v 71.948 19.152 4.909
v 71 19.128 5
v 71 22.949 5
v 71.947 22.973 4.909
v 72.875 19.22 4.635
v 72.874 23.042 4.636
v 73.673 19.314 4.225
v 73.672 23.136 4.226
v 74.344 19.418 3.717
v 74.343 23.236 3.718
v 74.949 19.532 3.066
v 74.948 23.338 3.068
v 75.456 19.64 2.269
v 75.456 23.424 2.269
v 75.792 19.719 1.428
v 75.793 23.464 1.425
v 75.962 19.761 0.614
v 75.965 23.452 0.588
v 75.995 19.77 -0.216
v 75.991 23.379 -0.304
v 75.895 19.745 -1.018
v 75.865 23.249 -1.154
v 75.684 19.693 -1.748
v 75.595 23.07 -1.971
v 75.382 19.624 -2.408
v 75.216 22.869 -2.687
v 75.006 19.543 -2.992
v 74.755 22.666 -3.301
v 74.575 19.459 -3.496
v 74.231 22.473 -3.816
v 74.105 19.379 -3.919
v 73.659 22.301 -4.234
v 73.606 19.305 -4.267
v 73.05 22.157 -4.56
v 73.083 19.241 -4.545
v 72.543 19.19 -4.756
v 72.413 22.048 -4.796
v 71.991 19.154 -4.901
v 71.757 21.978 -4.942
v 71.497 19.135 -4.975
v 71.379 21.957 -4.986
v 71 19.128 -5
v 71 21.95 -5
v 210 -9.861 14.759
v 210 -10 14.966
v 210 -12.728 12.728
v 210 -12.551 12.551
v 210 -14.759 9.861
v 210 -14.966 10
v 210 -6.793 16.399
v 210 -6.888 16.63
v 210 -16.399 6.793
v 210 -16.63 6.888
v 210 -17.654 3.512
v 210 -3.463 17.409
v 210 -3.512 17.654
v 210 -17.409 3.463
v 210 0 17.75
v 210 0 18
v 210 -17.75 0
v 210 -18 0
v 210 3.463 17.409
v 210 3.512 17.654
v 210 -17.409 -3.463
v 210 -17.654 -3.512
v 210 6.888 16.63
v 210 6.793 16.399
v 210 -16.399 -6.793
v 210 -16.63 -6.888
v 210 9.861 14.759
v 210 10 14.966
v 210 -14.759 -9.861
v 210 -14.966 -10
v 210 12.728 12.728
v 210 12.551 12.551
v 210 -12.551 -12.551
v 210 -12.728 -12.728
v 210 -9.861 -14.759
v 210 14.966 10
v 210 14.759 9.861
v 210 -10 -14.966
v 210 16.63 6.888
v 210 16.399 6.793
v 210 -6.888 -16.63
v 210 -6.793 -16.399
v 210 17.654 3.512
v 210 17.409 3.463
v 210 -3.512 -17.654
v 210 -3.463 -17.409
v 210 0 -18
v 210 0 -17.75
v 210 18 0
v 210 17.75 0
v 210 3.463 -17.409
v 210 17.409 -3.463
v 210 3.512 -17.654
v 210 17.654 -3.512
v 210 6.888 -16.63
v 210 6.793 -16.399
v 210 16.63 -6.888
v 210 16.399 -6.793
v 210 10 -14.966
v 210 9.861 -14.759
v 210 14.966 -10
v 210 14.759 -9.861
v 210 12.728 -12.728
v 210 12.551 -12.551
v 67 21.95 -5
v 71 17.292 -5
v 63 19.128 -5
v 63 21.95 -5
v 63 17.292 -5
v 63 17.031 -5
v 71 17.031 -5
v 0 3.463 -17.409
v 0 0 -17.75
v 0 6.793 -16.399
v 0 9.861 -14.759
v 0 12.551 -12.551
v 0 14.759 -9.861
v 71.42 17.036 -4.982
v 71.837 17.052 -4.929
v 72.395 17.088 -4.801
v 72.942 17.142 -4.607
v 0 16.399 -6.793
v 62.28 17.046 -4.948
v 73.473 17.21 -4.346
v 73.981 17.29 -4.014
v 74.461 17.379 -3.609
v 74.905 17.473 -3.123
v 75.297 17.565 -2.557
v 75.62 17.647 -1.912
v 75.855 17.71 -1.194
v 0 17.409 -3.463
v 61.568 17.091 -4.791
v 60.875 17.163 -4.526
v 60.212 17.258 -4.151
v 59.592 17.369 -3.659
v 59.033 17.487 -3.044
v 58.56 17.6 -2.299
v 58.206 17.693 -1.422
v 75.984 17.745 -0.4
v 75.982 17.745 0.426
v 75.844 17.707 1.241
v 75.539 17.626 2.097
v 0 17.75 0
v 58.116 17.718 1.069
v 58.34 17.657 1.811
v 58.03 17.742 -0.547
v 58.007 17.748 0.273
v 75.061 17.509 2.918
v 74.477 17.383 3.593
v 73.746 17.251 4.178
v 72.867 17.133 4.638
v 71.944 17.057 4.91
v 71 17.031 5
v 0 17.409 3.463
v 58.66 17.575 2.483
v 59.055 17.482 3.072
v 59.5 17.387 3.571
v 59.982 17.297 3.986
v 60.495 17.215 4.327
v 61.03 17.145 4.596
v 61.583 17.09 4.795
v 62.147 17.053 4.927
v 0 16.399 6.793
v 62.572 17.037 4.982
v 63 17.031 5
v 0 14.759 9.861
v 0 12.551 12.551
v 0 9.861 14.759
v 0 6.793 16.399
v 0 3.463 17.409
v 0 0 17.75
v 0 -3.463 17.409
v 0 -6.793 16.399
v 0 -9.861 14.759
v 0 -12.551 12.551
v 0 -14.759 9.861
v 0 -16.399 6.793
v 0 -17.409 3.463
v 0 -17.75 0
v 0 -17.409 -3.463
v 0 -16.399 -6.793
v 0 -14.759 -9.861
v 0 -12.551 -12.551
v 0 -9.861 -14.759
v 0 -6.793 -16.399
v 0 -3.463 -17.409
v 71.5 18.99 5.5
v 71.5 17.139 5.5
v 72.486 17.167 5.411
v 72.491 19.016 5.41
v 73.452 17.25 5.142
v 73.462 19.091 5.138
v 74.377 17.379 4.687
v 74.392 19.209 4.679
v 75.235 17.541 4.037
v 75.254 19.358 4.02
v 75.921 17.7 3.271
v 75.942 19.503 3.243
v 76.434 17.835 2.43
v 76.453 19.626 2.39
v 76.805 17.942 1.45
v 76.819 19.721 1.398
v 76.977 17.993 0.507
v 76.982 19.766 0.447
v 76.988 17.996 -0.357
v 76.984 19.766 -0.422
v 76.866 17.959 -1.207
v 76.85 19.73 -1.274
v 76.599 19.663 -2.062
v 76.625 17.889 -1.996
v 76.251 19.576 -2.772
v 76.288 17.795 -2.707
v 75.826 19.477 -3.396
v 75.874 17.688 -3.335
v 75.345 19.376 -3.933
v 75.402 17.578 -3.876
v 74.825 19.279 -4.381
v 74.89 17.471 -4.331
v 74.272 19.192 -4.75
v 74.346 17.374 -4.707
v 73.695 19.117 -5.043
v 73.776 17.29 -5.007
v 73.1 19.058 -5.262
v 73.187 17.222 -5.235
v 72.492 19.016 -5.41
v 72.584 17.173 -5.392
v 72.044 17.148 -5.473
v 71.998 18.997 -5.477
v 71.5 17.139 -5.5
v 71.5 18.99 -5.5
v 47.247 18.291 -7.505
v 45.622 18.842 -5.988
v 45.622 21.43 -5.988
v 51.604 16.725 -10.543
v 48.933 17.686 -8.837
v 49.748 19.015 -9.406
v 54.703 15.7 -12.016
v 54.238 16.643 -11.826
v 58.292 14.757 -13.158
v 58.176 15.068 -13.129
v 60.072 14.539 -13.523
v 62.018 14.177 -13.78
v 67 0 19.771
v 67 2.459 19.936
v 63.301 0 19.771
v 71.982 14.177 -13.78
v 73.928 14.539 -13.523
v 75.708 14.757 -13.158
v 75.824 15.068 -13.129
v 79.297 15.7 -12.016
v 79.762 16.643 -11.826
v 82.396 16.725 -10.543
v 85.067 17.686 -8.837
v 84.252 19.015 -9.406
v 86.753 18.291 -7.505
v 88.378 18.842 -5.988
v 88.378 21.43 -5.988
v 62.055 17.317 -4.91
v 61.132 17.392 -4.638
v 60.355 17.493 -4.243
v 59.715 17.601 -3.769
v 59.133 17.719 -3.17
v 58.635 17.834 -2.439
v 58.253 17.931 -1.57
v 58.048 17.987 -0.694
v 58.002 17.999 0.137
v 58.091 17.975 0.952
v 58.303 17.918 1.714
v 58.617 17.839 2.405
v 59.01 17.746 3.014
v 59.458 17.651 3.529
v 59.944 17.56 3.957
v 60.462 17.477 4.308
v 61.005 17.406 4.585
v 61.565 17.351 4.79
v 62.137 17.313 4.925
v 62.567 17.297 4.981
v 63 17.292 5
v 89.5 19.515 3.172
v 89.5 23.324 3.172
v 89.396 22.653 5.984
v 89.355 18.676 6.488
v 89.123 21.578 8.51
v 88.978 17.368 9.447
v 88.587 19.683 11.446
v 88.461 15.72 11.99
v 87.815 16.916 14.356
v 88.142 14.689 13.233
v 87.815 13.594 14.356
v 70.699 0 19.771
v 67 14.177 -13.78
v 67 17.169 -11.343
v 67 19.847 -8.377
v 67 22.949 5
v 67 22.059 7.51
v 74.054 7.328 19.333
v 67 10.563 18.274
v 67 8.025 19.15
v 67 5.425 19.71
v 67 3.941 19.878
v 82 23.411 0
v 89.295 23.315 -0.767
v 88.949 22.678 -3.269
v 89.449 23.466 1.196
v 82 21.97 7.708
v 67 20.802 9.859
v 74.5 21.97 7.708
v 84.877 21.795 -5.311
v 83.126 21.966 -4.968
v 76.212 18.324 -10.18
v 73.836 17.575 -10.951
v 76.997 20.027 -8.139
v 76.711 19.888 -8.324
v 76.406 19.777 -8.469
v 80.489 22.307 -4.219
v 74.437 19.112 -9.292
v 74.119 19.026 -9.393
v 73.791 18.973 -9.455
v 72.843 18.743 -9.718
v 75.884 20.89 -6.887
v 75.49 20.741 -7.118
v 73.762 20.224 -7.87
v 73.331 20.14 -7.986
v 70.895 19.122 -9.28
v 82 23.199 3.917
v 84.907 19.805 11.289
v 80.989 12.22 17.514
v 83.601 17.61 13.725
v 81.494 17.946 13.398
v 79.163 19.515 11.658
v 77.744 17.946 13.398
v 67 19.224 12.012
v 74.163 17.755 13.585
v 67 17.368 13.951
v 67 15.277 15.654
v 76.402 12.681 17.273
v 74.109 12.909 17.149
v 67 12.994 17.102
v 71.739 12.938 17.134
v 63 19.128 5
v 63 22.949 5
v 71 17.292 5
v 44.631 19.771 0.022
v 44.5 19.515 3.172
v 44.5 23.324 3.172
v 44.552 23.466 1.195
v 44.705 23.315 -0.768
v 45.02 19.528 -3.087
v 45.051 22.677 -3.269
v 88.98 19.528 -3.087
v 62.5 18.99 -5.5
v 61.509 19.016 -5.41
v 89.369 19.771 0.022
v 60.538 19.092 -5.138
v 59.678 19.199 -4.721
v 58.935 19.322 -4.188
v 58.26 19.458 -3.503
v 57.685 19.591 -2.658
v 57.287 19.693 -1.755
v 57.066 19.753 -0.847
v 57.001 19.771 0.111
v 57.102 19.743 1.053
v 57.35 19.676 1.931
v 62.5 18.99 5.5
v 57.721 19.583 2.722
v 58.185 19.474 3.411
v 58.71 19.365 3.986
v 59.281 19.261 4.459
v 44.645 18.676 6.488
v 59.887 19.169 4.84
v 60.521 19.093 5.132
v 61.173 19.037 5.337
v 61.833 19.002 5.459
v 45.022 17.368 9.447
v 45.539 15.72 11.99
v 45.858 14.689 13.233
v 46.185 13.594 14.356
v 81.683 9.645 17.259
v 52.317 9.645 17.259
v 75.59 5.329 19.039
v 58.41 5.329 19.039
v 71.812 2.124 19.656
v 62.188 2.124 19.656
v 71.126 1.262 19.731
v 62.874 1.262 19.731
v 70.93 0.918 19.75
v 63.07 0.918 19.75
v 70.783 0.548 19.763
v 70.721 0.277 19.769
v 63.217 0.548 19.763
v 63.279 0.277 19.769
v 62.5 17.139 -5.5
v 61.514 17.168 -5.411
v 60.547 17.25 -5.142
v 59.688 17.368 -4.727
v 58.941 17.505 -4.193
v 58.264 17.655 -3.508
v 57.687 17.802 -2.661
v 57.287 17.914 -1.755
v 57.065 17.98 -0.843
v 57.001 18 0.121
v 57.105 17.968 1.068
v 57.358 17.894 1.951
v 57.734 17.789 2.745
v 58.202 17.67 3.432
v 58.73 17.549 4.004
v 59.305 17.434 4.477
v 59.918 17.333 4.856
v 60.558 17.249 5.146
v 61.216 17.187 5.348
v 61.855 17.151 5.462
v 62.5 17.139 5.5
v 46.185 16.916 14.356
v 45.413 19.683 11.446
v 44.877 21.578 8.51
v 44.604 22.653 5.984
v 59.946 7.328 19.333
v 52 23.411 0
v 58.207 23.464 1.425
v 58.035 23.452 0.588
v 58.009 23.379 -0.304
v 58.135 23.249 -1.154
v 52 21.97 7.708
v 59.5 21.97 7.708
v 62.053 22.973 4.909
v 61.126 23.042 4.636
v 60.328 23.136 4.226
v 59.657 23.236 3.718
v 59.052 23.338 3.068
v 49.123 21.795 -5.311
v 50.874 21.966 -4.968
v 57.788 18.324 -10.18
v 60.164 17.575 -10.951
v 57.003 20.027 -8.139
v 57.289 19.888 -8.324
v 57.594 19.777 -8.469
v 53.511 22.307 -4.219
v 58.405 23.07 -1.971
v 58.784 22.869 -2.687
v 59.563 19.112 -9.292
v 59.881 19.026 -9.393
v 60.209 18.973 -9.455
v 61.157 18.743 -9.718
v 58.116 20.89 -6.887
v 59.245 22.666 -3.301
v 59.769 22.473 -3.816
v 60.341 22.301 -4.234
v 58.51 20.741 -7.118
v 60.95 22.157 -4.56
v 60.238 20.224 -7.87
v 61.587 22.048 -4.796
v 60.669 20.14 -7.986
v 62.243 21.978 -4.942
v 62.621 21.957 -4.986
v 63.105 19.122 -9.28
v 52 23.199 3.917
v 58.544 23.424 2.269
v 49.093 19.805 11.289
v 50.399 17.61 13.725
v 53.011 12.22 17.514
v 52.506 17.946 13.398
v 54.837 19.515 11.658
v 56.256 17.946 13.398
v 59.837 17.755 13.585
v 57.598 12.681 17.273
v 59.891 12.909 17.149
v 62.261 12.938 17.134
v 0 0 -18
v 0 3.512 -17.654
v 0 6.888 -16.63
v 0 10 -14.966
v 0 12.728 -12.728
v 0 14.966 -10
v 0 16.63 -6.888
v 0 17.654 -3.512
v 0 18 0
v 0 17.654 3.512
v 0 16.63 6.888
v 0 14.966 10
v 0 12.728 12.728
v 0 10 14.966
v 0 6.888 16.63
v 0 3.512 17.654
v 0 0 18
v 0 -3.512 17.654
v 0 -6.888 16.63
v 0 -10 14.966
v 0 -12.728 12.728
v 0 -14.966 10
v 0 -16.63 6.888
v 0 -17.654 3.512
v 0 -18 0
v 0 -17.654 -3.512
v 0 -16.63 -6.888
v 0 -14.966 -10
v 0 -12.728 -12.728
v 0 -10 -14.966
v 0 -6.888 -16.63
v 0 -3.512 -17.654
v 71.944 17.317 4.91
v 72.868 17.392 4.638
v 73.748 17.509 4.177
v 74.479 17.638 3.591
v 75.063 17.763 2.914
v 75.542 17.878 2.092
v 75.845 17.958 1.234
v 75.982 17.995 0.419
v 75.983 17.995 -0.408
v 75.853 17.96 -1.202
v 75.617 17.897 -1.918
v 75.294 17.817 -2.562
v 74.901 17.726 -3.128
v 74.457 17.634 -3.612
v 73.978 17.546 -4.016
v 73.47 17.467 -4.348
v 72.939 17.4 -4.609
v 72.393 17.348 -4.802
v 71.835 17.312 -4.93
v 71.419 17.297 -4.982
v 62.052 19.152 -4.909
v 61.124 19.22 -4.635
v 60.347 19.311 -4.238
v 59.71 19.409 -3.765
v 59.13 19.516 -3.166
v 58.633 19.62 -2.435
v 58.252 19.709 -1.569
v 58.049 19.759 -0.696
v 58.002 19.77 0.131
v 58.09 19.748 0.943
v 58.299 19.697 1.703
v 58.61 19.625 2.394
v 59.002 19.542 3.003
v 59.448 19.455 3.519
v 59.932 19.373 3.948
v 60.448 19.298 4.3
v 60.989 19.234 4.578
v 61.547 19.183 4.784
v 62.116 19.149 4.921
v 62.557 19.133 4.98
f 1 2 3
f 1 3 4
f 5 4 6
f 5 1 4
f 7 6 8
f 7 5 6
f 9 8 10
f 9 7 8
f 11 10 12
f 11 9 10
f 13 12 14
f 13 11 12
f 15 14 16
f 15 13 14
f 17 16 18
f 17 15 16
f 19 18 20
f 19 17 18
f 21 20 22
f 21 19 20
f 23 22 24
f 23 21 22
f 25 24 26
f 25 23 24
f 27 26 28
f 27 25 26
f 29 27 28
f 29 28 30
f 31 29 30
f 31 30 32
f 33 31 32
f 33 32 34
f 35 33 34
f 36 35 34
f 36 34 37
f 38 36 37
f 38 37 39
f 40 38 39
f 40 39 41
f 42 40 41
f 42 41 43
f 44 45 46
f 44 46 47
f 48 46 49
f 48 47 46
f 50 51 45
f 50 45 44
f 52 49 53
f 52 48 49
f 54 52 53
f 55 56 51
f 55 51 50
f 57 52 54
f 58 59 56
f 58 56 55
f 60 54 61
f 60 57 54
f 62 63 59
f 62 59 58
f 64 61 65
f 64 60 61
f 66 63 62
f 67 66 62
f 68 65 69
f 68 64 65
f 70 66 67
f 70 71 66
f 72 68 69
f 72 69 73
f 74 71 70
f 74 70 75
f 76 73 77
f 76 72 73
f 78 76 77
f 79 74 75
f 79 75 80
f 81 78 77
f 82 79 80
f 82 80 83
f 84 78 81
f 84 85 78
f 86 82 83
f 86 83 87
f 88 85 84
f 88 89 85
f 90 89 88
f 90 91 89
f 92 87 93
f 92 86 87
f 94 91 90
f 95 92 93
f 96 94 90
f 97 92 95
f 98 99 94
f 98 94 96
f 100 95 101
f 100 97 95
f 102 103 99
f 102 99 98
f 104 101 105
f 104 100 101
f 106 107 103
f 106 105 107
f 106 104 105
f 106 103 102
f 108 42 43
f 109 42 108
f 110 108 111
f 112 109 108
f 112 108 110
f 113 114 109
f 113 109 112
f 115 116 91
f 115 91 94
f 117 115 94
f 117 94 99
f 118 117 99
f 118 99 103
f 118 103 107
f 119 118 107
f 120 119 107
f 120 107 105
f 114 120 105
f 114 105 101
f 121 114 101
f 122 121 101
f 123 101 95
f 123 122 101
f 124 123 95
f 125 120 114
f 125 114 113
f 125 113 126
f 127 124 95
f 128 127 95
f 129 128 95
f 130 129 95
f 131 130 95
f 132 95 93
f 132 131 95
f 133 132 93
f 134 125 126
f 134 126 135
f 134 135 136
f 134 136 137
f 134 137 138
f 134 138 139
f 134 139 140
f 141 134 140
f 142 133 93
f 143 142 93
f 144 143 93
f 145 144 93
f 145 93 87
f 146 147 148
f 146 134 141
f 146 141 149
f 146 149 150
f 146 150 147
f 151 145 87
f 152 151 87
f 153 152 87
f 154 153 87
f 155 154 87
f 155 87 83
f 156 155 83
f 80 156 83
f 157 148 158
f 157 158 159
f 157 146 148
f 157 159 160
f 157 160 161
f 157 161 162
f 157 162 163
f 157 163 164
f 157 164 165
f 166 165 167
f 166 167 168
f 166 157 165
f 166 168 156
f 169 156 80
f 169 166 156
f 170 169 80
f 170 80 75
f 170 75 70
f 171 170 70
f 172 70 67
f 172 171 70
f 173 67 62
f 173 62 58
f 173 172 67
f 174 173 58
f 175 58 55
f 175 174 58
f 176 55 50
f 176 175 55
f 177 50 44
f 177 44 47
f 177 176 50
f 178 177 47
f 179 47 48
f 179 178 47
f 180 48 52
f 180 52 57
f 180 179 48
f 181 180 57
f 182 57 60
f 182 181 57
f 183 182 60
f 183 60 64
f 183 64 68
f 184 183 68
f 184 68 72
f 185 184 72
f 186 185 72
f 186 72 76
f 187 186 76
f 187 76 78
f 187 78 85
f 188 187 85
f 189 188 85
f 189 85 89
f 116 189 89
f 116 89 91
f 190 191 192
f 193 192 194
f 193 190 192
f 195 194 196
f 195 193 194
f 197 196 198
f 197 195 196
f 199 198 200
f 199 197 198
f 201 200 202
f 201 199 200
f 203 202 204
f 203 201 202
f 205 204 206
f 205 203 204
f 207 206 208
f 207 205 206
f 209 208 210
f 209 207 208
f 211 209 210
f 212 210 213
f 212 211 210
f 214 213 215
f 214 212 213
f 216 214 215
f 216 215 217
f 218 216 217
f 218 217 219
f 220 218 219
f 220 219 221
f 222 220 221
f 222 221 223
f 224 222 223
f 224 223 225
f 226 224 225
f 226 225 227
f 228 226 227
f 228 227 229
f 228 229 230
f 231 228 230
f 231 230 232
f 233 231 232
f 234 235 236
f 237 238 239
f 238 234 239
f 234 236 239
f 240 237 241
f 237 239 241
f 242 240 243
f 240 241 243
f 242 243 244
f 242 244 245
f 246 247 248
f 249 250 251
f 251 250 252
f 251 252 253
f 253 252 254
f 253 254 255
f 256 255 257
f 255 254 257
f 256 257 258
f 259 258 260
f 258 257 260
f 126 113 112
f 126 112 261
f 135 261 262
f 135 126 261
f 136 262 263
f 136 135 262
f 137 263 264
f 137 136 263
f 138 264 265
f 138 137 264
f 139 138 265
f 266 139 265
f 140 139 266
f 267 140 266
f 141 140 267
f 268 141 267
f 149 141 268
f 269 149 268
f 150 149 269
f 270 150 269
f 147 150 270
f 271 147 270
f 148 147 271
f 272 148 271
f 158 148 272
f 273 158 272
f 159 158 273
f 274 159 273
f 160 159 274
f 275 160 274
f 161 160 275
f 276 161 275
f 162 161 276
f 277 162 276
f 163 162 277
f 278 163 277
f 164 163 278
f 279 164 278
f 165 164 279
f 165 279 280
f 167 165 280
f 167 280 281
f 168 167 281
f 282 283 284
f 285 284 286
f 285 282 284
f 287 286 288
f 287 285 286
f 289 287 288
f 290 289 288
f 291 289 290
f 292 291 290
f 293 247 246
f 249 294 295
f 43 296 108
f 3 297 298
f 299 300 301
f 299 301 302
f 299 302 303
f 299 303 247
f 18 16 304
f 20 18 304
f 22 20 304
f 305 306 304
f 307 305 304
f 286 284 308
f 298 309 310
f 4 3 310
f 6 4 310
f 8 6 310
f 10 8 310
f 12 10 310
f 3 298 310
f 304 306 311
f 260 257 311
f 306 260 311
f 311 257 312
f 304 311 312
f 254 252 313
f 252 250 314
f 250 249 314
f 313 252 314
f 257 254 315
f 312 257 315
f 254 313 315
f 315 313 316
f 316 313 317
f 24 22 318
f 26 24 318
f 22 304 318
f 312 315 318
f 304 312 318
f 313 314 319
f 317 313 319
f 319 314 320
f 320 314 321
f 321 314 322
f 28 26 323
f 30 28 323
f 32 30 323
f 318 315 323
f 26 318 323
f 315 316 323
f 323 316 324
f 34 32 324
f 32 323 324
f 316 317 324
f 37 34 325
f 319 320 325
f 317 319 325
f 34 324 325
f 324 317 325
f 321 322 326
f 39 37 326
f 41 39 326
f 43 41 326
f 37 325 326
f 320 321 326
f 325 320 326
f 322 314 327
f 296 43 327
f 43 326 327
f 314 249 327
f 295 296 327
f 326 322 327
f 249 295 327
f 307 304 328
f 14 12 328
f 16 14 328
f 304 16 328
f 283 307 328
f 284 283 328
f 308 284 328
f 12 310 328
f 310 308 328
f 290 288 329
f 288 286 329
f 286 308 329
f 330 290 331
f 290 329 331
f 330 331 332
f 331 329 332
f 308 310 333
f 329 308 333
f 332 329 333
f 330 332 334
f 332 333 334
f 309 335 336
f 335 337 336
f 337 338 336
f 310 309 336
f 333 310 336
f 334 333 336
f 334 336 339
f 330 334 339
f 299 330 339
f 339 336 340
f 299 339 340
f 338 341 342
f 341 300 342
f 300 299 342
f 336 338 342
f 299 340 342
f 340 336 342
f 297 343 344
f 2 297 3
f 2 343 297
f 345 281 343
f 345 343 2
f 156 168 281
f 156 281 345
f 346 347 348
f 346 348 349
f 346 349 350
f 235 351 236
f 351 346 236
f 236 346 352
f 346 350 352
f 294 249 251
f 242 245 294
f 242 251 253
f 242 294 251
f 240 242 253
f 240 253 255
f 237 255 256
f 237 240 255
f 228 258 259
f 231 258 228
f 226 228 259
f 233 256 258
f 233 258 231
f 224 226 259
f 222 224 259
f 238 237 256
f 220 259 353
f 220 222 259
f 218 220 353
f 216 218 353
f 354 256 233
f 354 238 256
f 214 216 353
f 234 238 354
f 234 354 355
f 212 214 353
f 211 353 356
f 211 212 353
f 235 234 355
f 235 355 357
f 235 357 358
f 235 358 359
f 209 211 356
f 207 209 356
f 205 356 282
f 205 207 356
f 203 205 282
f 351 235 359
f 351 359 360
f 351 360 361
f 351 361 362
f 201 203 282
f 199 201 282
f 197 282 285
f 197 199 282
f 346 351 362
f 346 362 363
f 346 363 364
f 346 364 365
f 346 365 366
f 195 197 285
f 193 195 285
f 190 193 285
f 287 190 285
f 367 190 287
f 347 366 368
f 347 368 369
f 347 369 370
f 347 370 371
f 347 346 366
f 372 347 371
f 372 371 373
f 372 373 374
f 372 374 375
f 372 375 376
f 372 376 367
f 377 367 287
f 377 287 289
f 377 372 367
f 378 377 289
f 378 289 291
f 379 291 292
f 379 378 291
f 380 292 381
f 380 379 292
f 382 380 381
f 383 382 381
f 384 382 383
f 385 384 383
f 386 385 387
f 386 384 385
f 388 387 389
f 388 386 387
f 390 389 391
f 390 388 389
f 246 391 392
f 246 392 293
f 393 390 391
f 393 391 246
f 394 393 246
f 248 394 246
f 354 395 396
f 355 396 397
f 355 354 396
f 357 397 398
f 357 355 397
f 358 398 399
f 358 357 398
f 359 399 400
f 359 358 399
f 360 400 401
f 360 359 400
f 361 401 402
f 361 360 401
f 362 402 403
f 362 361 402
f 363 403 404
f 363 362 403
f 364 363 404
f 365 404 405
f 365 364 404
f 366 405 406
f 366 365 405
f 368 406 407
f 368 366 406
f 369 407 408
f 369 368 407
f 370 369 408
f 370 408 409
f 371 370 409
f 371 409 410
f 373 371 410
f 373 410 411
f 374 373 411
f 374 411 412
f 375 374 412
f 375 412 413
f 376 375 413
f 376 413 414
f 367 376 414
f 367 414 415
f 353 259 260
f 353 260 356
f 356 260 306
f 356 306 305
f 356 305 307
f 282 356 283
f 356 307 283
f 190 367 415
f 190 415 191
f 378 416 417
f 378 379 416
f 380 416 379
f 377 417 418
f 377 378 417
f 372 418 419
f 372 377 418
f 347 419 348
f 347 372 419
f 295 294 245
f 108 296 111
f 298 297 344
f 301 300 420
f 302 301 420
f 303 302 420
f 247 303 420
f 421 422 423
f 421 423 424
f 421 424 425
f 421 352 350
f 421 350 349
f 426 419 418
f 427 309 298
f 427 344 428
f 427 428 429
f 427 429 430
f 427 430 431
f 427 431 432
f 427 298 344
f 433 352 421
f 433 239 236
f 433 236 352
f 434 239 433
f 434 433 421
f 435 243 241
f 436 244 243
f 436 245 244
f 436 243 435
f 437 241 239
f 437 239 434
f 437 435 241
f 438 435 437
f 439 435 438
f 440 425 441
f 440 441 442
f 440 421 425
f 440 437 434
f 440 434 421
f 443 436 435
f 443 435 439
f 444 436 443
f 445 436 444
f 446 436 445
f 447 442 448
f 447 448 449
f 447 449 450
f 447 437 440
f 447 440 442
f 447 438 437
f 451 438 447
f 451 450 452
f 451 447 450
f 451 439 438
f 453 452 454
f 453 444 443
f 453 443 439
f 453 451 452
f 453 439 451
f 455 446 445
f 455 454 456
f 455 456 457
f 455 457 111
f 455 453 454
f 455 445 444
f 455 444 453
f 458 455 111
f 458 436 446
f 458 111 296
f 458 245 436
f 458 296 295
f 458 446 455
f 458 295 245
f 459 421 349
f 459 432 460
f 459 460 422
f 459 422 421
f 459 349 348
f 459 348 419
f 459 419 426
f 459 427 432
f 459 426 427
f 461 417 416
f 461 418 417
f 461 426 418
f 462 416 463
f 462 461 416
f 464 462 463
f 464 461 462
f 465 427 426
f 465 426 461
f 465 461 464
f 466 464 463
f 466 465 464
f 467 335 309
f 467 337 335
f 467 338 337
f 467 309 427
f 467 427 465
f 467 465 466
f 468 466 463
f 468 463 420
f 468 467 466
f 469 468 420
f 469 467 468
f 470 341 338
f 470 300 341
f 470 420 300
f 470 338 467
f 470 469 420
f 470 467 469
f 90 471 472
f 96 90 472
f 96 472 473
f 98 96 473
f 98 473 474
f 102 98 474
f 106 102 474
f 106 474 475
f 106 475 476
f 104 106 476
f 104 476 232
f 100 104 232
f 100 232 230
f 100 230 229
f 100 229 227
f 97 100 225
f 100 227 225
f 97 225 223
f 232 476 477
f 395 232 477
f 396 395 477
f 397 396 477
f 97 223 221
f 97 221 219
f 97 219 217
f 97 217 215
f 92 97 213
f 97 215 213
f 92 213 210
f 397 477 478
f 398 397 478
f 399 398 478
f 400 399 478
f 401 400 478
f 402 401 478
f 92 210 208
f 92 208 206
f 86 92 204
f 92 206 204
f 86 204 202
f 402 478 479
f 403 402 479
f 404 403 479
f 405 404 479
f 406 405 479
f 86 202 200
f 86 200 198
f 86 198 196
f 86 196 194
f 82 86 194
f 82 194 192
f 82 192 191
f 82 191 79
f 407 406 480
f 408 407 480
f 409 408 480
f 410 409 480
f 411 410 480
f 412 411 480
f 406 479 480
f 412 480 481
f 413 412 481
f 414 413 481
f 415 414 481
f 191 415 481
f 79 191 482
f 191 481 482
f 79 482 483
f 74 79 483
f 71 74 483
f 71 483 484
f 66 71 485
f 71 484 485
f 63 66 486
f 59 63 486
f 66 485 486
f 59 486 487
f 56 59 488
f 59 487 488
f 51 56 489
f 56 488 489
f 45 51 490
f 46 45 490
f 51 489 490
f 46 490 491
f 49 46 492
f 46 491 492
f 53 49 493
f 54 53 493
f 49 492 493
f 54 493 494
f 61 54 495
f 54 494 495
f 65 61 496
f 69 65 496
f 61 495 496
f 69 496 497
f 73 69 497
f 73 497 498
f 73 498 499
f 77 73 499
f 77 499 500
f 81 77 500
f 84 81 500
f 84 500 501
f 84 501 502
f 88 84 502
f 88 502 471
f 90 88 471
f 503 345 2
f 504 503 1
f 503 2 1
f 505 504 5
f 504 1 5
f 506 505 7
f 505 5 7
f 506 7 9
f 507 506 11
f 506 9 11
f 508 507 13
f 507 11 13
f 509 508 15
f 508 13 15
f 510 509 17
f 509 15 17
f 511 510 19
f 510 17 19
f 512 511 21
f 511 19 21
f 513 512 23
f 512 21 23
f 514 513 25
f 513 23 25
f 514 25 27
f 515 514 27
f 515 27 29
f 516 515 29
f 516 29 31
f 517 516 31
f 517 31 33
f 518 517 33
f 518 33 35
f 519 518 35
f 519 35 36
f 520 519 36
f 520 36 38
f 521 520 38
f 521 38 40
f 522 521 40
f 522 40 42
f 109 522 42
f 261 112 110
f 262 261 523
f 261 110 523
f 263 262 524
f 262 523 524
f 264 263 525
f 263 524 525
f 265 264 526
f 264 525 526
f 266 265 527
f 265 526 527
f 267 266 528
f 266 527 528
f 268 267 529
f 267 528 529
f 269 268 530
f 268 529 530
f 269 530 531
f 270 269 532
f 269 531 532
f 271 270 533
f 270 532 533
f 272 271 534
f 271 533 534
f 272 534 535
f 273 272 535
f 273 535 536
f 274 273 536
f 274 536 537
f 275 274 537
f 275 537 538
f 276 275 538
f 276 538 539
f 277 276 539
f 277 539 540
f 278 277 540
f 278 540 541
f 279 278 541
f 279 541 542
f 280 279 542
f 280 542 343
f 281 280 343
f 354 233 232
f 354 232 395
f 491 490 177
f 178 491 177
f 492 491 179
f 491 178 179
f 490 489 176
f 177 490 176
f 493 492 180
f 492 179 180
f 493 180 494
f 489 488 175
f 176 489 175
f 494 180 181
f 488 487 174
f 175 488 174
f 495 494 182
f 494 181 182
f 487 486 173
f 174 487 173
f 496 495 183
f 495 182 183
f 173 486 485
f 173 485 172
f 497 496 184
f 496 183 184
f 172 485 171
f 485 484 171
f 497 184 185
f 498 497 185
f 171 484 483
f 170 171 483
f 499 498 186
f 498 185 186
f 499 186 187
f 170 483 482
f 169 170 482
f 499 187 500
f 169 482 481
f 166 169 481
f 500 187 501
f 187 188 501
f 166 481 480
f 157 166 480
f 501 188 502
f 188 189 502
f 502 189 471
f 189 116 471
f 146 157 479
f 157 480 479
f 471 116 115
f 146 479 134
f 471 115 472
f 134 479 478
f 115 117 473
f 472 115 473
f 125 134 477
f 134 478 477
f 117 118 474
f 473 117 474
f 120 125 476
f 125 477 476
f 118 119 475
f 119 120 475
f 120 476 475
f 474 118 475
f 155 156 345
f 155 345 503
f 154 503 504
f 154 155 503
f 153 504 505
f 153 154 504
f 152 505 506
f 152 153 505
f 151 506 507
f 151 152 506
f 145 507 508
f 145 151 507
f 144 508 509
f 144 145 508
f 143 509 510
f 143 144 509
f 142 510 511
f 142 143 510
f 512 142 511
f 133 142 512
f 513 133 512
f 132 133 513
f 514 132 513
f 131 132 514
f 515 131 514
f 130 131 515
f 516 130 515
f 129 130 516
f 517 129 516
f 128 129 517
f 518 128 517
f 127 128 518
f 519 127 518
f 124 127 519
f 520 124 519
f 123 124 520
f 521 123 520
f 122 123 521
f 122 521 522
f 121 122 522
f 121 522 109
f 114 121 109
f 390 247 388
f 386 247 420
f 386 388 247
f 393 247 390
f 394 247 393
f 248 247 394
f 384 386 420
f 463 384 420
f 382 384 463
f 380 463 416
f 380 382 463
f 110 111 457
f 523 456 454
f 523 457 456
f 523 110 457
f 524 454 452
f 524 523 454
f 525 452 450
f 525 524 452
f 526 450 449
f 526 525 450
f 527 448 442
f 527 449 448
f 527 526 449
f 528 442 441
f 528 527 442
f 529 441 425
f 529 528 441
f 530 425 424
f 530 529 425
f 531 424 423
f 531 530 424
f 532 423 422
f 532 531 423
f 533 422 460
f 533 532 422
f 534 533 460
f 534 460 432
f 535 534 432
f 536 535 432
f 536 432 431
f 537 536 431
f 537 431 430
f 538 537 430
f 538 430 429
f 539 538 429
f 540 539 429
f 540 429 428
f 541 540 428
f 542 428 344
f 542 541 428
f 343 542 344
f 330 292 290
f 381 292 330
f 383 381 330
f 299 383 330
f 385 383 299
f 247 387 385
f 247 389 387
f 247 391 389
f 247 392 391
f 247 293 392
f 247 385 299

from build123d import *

# Parameters (mm, degrees)
SKETCH1_R                = 18
SKETCH1_R_2              = 17.75
BOSS_EXTRUDE1_DEPTH      = 210
BOSS_EXTRUDE2_DEPTH      = 22.5
CUT_EXTRUDE2_DEPTH       = 213.245370912
CUT_EXTRUDE12_START      = -27
CUT_EXTRUDE12_DEPTH      = 23.323952
CUT_EXTRUDE13_REACH      = 217.691
CUT_EXTRUDE13_END_RADIUS = 19.770854308
BOSS_EXTRUDE3_REACH      = 235.245
BOSS_EXTRUDE3_END_RADIUS = 18
BOSS_EXTRUDE3_START      = 21


with BuildPart() as part:
    # Sketch1 → Boss-Extrude1 (new body)
    with BuildSketch(Plane(origin=(0, 0, 0), x_dir=(0, 0, -1), z_dir=(1, 0, 0))):
        Circle(SKETCH1_R)
        Circle(SKETCH1_R_2, mode=Mode.SUBTRACT)
    extrude(amount=BOSS_EXTRUDE1_DEPTH)


with BuildPart() as body_2:
    # Sketch4 → Boss-Extrude2 (new, symmetric)
    with BuildSketch(Plane.ZY.offset(-67)):
        with BuildLine():
            ThreePointArc((-13.779943134, 14.177441493), (7.695629669, 18.21164364), (19.770854308, 0))
            add(Edge.make_bspline(
                [(-13.779943134, 14.177441493), (-10.685751008, 18.612681967), (-3.179720318, 24.881089629), (14.245409909, 21.177624873), (20.93871501, 8.550633365), (19.770854308, 0)],
                knots=[0, 0, 0, 0, 0.331280275, 0.485623577, 1, 1, 1, 1], degree=3))
        make_face()
    extrude(amount=BOSS_EXTRUDE2_DEPTH, both=True)


with BuildPart() as cut_extrude2_tool:
    # Sketch2 → Cut-Extrude2 (new, through all)
    with BuildSketch(Plane(origin=(0, 0, 0), x_dir=(1, 0, 0), z_dir=(0, 1, 0))):
        with BuildLine():
            Line((63, -5), (71, -5))
            ThreePointArc((71, -5), (76, 0), (71, 5))
            Line((71, 5), (63, 5))
            ThreePointArc((63, 5), (58, 0), (63, -5))
        make_face()
    extrude(amount=CUT_EXTRUDE2_DEPTH)


with BuildPart() as part_1:
    add(part.part)

    # Cut-Extrude2: cut by cut_extrude2_tool
    add(cut_extrude2_tool.part, mode=Mode.SUBTRACT)



with BuildPart() as body_2_1:
    add(body_2.part)

    # Cut-Extrude2: cut by cut_extrude2_tool
    add(cut_extrude2_tool.part, mode=Mode.SUBTRACT)

    # Sketch7 → Cut-Extrude12 (cut)
    with BuildSketch(Plane(origin=(0, 27, 0), x_dir=(1, 0, 0), z_dir=(0, 1, 0)).offset(CUT_EXTRUDE12_START)):
        with BuildLine():
            ThreePointArc((46.185450517, -14.355615707), (44.923728597, -8.827176662), (44.5, -3.172441075))
            Line((44.5, -3.172441075), (44.5, -19.93558029))
            Line((44.5, -19.93558029), (67, -19.93558029))
            ThreePointArc((67, -19.93558029), (56.225243913, -18.516387819), (46.185450517, -14.355615707))
        make_face()
        with BuildLine():
            ThreePointArc((87.814549483, -14.355615707), (77.774756087, -18.516387819), (67, -19.93558029))
            Line((67, -19.93558029), (89.5, -19.93558029))
            Line((89.5, -19.93558029), (89.5, -3.172440538))
            ThreePointArc((89.5, -3.172440538), (89.076271443, -8.827176396), (87.814549483, -14.355615707))
        make_face()
    extrude(amount=CUT_EXTRUDE12_DEPTH, mode=Mode.SUBTRACT)

    # Cut-Extrude13: up to this cylinder (the profile starts outside it)
    cut_extrude13_end = Plane(origin=(67, 0, 0), z_dir=(1, 0, 0)) * Cylinder(CUT_EXTRUDE13_END_RADIUS, 512.063876616, mode=Mode.PRIVATE)
    # Sketch7<4> → Cut-Extrude13 (cut, up to the surface)
    with BuildSketch(Plane(origin=(0, 27, 0), x_dir=(1, 0, 0), z_dir=(0, 1, 0)), mode=Mode.PRIVATE) as cut_extrude13_sk1:
        with BuildLine():
            Line((62.018448737, 13.779943134), (44.5, 13.779943134))
            Line((44.5, 13.779943134), (44.5, -3.172441075))
            ThreePointArc((44.5, -3.172441075), (44.781644245, 1.442087549), (45.622395888, 5.98811159))
            ThreePointArc((45.622395888, 5.98811159), (53.132553103, 11.331484209), (62.018448737, 13.779943134))
        make_face()
    cut_extrude13_tool1 = extrude(cut_extrude13_sk1.sketch, amount=-CUT_EXTRUDE13_REACH, mode=Mode.PRIVATE) - cut_extrude13_end
    add(cut_extrude13_tool1.solids().sort_by_distance((48.929916, 27, -10.778916))[0], mode=Mode.SUBTRACT)
    # Sketch7<4> → Cut-Extrude13 (cut, up to the surface)
    with BuildSketch(Plane(origin=(0, 27, 0), x_dir=(1, 0, 0), z_dir=(0, 1, 0)), mode=Mode.PRIVATE) as cut_extrude13_sk2:
        with BuildLine():
            Line((89.5, 13.779943134), (71.981551263, 13.779943134))
            ThreePointArc((71.981551263, 13.779943134), (80.867446897, 11.331484209), (88.377604112, 5.98811159))
            ThreePointArc((88.377604112, 5.98811159), (89.218355722, 1.442087815), (89.5, -3.172440538))
            Line((89.5, -3.172440538), (89.5, 13.779943134))
        make_face()
    cut_extrude13_tool2 = extrude(cut_extrude13_sk2.sketch, amount=-CUT_EXTRUDE13_REACH, mode=Mode.PRIVATE) - cut_extrude13_end
    add(cut_extrude13_tool2.solids().sort_by_distance((85.070084, 27, -10.778916))[0], mode=Mode.SUBTRACT)


with BuildPart() as part_2:
    add(part_1.part)

    add(body_2_1.part)  # Boss-Extrude3 merges body 2
    # Boss-Extrude3: up to this cylinder (the profile starts outside it)
    boss_extrude3_end = Plane(origin=(67, 0, 0), z_dir=(-1, 0, 0)) * Cylinder(BOSS_EXTRUDE3_END_RADIUS, 507.49, mode=Mode.PRIVATE)
    # Sketch2<3> → Boss-Extrude3 (add, up to the surface)
    with BuildSketch(Plane(origin=(0, 0, 0), x_dir=(1, 0, 0), z_dir=(0, 1, 0)).offset(BOSS_EXTRUDE3_START), mode=Mode.PRIVATE) as boss_extrude3_sk1:
        with BuildLine():
            Line((62.5, -5.5), (71.5, -5.5))
            ThreePointArc((71.5, -5.5), (77, 0), (71.5, 5.5))
            Line((71.5, 5.5), (62.5, 5.5))
            ThreePointArc((62.5, 5.5), (57, 0), (62.5, -5.5))
        make_face()
        with BuildLine():
            ThreePointArc((71, -5), (76, 0), (71, 5))
            Line((71, 5), (63, 5))
            ThreePointArc((63, 5), (58, 0), (63, -5))
            Line((63, -5), (71, -5))
        make_face(mode=Mode.SUBTRACT)
    boss_extrude3_tool1 = extrude(boss_extrude3_sk1.sketch, amount=-BOSS_EXTRUDE3_REACH, mode=Mode.PRIVATE) - boss_extrude3_end
    add(boss_extrude3_tool1.solids().sort_by_distance((67, 21, 5.271746))[0])


solid = part_2.part
